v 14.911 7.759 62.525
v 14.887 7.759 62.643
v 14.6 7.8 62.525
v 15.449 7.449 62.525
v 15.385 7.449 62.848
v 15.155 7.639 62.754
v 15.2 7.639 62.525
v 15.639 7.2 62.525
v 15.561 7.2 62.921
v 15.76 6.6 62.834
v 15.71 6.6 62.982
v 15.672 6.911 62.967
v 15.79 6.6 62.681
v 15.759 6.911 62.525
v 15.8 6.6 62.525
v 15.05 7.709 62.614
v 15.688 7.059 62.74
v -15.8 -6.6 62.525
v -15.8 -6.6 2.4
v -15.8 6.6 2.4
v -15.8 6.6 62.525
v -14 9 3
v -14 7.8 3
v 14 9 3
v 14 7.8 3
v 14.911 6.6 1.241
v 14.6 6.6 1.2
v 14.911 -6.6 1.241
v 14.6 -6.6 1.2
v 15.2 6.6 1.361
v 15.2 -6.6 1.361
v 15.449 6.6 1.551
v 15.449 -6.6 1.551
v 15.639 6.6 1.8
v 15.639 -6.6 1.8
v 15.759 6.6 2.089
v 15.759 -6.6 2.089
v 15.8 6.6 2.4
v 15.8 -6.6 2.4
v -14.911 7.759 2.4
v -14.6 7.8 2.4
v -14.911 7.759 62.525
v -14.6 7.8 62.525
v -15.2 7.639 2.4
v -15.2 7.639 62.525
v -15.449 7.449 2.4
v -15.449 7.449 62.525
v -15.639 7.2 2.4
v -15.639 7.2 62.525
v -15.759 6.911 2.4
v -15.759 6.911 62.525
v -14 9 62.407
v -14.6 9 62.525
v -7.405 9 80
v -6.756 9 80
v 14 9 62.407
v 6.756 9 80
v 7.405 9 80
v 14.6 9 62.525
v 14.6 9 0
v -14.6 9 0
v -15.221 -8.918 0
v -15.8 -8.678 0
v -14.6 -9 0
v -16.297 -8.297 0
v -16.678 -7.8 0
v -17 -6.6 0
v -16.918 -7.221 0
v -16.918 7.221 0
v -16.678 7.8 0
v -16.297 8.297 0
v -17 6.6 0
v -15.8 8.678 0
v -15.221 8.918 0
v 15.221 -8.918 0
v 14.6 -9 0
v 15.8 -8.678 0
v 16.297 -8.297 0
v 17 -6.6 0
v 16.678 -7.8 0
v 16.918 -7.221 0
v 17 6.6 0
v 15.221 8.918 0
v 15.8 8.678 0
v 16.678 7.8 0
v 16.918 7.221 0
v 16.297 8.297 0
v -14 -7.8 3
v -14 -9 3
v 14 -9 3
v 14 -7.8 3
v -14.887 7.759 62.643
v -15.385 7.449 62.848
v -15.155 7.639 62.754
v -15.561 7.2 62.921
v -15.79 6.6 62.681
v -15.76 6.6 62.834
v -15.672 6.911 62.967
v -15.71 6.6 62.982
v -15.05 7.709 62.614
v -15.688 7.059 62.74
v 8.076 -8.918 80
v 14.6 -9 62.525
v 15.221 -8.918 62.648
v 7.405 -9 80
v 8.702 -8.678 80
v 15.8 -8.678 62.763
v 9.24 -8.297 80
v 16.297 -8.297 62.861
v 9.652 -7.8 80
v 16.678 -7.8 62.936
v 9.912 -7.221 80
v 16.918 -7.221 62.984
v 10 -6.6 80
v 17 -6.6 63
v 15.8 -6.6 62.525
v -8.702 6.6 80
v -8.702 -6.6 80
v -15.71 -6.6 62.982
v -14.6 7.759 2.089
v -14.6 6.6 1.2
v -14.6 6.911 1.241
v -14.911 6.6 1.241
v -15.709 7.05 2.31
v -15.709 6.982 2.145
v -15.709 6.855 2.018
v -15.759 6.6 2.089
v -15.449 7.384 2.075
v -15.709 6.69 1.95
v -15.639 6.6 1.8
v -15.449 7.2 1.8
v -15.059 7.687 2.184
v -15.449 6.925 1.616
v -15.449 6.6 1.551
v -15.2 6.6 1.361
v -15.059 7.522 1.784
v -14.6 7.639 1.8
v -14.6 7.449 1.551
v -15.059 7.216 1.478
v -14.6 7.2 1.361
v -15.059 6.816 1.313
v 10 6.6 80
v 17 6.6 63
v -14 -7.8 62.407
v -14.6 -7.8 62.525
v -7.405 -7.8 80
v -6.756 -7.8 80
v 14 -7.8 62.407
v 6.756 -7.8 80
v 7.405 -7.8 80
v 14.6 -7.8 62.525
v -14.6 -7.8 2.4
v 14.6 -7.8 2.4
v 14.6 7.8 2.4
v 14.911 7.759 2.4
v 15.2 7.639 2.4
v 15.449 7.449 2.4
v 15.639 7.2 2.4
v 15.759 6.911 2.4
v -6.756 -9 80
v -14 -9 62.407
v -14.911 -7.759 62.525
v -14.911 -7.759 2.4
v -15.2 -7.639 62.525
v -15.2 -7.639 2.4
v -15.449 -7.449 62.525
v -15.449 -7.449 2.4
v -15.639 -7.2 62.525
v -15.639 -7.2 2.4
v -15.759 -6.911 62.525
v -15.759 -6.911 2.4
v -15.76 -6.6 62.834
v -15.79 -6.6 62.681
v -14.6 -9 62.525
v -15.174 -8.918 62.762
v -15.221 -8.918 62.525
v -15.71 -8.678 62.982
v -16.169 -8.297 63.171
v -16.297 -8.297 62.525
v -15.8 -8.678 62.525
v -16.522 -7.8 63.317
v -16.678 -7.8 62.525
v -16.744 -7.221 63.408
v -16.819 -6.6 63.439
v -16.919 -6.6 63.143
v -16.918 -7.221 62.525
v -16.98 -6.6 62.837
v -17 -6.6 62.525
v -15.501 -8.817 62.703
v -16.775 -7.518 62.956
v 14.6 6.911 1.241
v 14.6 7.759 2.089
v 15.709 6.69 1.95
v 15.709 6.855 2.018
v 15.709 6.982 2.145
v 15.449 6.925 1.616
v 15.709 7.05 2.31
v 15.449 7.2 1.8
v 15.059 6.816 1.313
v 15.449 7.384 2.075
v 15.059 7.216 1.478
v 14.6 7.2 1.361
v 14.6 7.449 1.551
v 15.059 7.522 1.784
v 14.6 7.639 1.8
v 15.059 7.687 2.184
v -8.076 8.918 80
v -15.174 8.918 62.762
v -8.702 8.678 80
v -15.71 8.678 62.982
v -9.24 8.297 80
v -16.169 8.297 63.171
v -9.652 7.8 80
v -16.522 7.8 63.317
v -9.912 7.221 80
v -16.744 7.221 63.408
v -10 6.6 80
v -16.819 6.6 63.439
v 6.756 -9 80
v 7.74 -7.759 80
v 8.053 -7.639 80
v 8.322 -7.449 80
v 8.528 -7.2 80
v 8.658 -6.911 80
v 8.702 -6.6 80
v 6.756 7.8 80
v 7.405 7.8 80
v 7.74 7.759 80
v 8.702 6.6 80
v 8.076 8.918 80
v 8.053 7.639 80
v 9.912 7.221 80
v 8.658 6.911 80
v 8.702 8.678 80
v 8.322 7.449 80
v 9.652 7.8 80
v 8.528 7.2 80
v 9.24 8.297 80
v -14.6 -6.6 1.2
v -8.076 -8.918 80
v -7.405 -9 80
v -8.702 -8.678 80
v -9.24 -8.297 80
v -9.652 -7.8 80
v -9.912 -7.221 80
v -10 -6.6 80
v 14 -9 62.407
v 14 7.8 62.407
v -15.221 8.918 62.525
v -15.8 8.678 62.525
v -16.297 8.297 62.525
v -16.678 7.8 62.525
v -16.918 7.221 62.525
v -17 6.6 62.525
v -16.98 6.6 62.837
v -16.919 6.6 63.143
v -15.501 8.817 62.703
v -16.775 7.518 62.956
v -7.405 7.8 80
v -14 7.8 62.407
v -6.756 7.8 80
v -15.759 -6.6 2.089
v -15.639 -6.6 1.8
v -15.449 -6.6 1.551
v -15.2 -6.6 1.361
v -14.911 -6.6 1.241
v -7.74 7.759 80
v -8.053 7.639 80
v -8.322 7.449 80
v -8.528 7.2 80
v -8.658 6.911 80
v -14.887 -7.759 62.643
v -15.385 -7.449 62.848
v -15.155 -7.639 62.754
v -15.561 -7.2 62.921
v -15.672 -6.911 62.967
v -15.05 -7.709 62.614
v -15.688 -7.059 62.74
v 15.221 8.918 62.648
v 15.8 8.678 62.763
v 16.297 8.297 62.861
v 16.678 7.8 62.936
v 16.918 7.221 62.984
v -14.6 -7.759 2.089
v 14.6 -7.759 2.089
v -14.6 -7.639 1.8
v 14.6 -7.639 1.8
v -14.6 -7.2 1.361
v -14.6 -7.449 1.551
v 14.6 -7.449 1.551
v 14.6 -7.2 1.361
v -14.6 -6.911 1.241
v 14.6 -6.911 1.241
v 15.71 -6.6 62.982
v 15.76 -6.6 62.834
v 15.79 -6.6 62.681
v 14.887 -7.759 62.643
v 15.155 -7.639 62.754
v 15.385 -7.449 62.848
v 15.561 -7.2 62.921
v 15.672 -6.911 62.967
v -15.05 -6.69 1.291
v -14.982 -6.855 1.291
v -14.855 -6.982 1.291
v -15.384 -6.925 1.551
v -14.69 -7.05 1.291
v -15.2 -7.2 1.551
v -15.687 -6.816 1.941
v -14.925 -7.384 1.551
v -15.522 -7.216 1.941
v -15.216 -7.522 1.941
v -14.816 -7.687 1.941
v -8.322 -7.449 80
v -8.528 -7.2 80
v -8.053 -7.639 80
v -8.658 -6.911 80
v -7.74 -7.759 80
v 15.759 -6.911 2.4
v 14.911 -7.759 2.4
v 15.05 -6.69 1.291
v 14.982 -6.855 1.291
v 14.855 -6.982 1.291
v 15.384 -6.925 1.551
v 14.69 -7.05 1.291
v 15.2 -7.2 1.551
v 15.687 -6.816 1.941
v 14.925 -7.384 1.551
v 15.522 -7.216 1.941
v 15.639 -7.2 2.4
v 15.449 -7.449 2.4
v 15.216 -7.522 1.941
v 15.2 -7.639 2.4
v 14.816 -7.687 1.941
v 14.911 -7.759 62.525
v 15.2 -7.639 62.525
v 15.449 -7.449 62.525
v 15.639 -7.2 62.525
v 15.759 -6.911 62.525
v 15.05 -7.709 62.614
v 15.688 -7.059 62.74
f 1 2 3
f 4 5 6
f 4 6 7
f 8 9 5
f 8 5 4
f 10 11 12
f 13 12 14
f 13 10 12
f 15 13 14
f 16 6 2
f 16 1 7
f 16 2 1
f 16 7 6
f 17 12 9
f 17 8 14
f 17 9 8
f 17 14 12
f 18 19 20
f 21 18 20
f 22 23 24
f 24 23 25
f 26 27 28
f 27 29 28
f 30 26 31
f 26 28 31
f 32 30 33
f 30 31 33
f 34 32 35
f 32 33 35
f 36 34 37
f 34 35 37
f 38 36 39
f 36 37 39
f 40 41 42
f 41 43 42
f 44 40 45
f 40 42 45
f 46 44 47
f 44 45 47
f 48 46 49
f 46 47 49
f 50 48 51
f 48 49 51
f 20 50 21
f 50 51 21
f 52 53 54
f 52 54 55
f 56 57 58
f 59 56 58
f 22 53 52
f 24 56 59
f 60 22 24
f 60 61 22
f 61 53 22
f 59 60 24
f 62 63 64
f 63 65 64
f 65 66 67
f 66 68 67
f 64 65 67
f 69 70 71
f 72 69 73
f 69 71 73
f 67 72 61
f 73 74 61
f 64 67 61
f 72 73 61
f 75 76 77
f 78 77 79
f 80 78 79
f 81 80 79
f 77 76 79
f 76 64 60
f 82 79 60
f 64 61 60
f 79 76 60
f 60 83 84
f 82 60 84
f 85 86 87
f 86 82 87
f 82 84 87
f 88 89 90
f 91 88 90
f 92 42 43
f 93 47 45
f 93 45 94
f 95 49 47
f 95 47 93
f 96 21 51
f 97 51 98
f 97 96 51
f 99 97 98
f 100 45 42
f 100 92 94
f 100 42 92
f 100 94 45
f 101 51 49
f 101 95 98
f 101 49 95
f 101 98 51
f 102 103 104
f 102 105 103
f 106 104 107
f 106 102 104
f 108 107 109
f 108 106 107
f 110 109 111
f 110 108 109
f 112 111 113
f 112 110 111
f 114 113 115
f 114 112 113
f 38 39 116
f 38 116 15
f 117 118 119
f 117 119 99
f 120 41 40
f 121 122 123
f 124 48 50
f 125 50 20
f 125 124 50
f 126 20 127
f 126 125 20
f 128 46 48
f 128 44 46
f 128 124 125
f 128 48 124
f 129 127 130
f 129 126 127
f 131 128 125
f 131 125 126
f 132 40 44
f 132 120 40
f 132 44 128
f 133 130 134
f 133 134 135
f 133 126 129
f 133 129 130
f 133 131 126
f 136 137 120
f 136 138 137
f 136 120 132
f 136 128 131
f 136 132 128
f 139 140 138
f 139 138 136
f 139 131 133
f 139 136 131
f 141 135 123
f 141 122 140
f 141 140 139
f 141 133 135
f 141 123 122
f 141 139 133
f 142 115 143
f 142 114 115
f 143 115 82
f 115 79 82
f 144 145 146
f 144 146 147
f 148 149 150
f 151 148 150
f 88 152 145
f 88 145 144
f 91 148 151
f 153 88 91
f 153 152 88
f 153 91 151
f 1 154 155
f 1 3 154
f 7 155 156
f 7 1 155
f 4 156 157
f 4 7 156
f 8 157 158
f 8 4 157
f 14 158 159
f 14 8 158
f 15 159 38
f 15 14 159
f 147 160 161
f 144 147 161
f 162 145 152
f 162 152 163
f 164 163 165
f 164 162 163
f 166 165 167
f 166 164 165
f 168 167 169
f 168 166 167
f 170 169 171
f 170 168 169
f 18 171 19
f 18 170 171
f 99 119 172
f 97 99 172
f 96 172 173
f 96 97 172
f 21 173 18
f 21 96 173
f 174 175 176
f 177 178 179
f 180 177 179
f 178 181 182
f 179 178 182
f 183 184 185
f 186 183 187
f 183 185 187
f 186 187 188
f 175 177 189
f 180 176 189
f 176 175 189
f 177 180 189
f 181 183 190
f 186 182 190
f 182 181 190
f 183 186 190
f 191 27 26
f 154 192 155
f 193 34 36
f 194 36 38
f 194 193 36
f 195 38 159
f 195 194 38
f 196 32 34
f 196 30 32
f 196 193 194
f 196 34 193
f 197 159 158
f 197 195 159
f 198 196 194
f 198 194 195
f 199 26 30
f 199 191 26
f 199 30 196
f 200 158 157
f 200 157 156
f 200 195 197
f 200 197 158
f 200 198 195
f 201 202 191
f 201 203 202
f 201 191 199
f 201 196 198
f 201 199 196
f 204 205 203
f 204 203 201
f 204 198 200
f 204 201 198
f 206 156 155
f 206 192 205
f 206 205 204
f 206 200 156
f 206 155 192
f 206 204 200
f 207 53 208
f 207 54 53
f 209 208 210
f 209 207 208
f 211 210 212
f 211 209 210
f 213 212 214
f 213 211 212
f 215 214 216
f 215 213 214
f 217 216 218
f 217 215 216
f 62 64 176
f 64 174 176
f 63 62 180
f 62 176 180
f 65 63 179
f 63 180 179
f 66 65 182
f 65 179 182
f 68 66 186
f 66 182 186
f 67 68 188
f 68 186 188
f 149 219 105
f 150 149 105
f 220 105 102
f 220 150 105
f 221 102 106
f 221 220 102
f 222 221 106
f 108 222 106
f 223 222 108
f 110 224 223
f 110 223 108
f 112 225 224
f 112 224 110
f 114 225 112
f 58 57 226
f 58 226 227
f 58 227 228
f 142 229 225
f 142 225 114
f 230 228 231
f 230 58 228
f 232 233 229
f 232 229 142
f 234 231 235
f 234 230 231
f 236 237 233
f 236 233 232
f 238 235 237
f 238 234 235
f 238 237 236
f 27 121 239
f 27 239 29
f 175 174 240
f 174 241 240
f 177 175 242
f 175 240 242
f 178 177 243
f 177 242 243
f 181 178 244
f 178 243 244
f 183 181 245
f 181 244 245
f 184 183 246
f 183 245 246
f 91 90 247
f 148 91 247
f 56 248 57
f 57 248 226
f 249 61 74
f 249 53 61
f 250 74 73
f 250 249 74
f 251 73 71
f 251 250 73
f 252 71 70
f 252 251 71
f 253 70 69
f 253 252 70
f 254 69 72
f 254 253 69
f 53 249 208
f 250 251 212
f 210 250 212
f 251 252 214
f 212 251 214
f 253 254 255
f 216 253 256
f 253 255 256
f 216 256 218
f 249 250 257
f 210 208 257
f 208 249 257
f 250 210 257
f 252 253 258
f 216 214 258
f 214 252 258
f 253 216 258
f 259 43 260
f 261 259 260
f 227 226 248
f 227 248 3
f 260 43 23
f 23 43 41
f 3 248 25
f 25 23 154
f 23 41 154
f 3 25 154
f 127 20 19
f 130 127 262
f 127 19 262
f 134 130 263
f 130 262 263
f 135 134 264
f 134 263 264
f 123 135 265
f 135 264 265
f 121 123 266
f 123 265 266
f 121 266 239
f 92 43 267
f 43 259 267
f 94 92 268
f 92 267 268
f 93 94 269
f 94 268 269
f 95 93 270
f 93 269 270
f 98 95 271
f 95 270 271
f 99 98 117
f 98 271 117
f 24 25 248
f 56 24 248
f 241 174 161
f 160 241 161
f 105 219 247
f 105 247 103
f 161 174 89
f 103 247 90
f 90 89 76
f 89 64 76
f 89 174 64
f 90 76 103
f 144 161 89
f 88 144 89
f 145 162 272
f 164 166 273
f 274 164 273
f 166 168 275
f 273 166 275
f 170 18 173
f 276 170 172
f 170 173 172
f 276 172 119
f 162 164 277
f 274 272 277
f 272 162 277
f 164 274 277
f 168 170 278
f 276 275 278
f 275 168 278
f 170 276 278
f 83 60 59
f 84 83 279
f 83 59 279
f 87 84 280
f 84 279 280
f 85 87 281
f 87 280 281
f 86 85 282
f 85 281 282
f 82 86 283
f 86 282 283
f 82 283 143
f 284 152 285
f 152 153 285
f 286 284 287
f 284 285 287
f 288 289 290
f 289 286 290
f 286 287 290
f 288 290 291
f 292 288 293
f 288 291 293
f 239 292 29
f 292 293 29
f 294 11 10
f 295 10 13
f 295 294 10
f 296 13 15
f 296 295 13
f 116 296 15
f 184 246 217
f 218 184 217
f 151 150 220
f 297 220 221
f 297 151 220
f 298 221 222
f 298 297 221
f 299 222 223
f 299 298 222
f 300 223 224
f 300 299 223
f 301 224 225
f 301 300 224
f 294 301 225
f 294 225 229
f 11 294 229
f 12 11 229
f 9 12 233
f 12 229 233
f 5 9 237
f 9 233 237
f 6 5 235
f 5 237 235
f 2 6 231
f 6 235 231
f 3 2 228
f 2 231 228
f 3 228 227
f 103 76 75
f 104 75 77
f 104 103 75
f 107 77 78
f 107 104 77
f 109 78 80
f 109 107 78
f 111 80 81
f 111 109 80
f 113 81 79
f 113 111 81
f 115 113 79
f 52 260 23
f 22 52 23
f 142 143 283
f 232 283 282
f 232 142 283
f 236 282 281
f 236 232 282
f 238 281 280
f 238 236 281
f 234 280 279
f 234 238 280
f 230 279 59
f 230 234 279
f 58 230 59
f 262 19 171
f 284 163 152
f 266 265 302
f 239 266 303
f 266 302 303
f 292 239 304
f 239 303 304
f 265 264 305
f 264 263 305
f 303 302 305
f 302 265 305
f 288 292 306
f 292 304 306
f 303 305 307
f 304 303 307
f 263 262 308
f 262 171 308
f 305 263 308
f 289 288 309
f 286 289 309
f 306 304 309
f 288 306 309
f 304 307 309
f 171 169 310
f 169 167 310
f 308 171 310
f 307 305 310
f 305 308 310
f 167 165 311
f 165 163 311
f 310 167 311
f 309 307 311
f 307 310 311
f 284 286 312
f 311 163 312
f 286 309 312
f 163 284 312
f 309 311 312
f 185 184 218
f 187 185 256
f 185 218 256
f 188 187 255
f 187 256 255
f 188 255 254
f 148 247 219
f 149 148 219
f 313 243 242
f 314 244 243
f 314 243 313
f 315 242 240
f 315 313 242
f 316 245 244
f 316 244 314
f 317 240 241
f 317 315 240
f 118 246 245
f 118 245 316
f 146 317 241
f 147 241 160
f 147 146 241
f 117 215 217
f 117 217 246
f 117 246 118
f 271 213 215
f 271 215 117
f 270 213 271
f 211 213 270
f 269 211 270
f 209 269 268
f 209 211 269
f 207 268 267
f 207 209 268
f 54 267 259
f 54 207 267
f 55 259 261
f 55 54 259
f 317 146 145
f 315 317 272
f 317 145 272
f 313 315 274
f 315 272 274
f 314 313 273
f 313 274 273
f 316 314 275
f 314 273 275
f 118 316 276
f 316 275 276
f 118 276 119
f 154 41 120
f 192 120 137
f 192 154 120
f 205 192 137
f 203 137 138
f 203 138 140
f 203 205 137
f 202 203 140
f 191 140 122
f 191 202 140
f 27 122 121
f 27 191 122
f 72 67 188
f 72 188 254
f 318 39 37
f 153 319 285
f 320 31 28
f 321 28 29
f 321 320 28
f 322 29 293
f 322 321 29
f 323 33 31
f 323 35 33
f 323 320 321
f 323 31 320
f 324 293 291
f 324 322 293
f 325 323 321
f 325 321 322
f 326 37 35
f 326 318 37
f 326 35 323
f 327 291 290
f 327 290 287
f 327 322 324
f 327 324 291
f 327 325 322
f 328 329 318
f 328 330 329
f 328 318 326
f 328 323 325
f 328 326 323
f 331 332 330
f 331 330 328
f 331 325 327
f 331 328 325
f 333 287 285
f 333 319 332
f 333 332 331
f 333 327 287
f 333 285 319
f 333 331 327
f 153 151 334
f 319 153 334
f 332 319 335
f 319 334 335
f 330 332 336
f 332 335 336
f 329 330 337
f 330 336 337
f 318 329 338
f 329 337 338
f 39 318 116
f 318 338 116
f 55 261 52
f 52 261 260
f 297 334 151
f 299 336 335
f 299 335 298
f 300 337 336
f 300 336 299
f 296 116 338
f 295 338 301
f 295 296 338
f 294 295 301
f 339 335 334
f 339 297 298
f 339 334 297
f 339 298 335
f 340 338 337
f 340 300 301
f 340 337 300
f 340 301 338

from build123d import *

# Parameters (mm, degrees)
F0_W       = 34
F0_H       = 18
F1_DEPTH   = 80
F2_SIZE2   = 7
F2_SIZE    = 17
F2_2_SIZE2 = 7
F2_2_SIZE  = 17
F3_T       = -1.2
F5_DEPTH   = 18.001
F6_R       = 1.2
F7_R       = 2.4


with BuildPart() as f1:
    # F0 (on Top) → F1 (new body)
    with BuildSketch(Plane.XY):
        Rectangle(F0_W, F0_H)
    extrude(amount=F1_DEPTH)

    # F2
    f2_edges = [f1.edges().sort_by_distance(p)[0] for p in [
        (-17, 0, 80),
    ]]
    f2_side = f1.faces().sort_by_distance((-17, 0, 40))[0]
    chamfer(f2_edges, length=F2_SIZE, length2=F2_SIZE2, reference=f2_side)

    # F2#2
    f2_2_edges = [f1.edges().sort_by_distance(p)[0] for p in [
        (17, 0, 80),
    ]]
    f2_2_side = f1.faces().sort_by_distance((17, 0, 40))[0]
    chamfer(f2_2_edges, length=F2_2_SIZE, length2=F2_2_SIZE2, reference=f2_2_side)

    # F3
    f3_openings = [f1.faces().sort_by_distance(p)[0] for p in [
        (0, 0, 80),
    ]]
    offset(amount=F3_T, openings=f3_openings)

    # F4 (on face) → F5 (cut, through all)
    with BuildSketch(Plane.XZ.offset(9)):
        Polygon((-6.7556277098, 80), (-14, 62.4065244382), (-14, 3), (14, 3), (14, 62.4065244382), (6.7556277098, 80), align=None)
    extrude(amount=-F5_DEPTH, mode=Mode.SUBTRACT)

    # F6
    f6_edges = [f1.edges().sort_by_distance(p)[0] for p in [
        (0, 7.8, 1.2),
        (-15.8, 7.8, 31.981305),
        (-15.8, -7.8, 31.981305),
        (15.8, -7.8, 31.981305),
        (15.8, 0, 1.2),
        (15.8, 7.8, 31.981305),
        (-15.8, 0, 1.2),
        (0, -7.8, 1.2),
        (-12.251126, -7.8, 71.381305),
        (12.251126, -7.8, 71.381305),
        (15.8, 0, 62.76261),
        (12.251126, 7.8, 71.381305),
        (-12.251126, 7.8, 71.381305),
        (-15.8, 0, 62.76261),
    ]]
    fillet(f6_edges, radius=F6_R)

    # F7
    f7_edges = [f1.edges().sort_by_distance(p)[0] for p in [
        (-17, 9, 31.5),
        (17, 9, 31.5),
        (-17, -9, 31.5),
        (-13.5, 9, 71.5),
        (-17, 0, 63),
        (-13.5, -9, 71.5),
        (13.5, -9, 71.5),
        (17, -9, 31.5),
        (13.5, 9, 71.5),
    ]]
    fillet(f7_edges, radius=F7_R)


solid = f1.part
